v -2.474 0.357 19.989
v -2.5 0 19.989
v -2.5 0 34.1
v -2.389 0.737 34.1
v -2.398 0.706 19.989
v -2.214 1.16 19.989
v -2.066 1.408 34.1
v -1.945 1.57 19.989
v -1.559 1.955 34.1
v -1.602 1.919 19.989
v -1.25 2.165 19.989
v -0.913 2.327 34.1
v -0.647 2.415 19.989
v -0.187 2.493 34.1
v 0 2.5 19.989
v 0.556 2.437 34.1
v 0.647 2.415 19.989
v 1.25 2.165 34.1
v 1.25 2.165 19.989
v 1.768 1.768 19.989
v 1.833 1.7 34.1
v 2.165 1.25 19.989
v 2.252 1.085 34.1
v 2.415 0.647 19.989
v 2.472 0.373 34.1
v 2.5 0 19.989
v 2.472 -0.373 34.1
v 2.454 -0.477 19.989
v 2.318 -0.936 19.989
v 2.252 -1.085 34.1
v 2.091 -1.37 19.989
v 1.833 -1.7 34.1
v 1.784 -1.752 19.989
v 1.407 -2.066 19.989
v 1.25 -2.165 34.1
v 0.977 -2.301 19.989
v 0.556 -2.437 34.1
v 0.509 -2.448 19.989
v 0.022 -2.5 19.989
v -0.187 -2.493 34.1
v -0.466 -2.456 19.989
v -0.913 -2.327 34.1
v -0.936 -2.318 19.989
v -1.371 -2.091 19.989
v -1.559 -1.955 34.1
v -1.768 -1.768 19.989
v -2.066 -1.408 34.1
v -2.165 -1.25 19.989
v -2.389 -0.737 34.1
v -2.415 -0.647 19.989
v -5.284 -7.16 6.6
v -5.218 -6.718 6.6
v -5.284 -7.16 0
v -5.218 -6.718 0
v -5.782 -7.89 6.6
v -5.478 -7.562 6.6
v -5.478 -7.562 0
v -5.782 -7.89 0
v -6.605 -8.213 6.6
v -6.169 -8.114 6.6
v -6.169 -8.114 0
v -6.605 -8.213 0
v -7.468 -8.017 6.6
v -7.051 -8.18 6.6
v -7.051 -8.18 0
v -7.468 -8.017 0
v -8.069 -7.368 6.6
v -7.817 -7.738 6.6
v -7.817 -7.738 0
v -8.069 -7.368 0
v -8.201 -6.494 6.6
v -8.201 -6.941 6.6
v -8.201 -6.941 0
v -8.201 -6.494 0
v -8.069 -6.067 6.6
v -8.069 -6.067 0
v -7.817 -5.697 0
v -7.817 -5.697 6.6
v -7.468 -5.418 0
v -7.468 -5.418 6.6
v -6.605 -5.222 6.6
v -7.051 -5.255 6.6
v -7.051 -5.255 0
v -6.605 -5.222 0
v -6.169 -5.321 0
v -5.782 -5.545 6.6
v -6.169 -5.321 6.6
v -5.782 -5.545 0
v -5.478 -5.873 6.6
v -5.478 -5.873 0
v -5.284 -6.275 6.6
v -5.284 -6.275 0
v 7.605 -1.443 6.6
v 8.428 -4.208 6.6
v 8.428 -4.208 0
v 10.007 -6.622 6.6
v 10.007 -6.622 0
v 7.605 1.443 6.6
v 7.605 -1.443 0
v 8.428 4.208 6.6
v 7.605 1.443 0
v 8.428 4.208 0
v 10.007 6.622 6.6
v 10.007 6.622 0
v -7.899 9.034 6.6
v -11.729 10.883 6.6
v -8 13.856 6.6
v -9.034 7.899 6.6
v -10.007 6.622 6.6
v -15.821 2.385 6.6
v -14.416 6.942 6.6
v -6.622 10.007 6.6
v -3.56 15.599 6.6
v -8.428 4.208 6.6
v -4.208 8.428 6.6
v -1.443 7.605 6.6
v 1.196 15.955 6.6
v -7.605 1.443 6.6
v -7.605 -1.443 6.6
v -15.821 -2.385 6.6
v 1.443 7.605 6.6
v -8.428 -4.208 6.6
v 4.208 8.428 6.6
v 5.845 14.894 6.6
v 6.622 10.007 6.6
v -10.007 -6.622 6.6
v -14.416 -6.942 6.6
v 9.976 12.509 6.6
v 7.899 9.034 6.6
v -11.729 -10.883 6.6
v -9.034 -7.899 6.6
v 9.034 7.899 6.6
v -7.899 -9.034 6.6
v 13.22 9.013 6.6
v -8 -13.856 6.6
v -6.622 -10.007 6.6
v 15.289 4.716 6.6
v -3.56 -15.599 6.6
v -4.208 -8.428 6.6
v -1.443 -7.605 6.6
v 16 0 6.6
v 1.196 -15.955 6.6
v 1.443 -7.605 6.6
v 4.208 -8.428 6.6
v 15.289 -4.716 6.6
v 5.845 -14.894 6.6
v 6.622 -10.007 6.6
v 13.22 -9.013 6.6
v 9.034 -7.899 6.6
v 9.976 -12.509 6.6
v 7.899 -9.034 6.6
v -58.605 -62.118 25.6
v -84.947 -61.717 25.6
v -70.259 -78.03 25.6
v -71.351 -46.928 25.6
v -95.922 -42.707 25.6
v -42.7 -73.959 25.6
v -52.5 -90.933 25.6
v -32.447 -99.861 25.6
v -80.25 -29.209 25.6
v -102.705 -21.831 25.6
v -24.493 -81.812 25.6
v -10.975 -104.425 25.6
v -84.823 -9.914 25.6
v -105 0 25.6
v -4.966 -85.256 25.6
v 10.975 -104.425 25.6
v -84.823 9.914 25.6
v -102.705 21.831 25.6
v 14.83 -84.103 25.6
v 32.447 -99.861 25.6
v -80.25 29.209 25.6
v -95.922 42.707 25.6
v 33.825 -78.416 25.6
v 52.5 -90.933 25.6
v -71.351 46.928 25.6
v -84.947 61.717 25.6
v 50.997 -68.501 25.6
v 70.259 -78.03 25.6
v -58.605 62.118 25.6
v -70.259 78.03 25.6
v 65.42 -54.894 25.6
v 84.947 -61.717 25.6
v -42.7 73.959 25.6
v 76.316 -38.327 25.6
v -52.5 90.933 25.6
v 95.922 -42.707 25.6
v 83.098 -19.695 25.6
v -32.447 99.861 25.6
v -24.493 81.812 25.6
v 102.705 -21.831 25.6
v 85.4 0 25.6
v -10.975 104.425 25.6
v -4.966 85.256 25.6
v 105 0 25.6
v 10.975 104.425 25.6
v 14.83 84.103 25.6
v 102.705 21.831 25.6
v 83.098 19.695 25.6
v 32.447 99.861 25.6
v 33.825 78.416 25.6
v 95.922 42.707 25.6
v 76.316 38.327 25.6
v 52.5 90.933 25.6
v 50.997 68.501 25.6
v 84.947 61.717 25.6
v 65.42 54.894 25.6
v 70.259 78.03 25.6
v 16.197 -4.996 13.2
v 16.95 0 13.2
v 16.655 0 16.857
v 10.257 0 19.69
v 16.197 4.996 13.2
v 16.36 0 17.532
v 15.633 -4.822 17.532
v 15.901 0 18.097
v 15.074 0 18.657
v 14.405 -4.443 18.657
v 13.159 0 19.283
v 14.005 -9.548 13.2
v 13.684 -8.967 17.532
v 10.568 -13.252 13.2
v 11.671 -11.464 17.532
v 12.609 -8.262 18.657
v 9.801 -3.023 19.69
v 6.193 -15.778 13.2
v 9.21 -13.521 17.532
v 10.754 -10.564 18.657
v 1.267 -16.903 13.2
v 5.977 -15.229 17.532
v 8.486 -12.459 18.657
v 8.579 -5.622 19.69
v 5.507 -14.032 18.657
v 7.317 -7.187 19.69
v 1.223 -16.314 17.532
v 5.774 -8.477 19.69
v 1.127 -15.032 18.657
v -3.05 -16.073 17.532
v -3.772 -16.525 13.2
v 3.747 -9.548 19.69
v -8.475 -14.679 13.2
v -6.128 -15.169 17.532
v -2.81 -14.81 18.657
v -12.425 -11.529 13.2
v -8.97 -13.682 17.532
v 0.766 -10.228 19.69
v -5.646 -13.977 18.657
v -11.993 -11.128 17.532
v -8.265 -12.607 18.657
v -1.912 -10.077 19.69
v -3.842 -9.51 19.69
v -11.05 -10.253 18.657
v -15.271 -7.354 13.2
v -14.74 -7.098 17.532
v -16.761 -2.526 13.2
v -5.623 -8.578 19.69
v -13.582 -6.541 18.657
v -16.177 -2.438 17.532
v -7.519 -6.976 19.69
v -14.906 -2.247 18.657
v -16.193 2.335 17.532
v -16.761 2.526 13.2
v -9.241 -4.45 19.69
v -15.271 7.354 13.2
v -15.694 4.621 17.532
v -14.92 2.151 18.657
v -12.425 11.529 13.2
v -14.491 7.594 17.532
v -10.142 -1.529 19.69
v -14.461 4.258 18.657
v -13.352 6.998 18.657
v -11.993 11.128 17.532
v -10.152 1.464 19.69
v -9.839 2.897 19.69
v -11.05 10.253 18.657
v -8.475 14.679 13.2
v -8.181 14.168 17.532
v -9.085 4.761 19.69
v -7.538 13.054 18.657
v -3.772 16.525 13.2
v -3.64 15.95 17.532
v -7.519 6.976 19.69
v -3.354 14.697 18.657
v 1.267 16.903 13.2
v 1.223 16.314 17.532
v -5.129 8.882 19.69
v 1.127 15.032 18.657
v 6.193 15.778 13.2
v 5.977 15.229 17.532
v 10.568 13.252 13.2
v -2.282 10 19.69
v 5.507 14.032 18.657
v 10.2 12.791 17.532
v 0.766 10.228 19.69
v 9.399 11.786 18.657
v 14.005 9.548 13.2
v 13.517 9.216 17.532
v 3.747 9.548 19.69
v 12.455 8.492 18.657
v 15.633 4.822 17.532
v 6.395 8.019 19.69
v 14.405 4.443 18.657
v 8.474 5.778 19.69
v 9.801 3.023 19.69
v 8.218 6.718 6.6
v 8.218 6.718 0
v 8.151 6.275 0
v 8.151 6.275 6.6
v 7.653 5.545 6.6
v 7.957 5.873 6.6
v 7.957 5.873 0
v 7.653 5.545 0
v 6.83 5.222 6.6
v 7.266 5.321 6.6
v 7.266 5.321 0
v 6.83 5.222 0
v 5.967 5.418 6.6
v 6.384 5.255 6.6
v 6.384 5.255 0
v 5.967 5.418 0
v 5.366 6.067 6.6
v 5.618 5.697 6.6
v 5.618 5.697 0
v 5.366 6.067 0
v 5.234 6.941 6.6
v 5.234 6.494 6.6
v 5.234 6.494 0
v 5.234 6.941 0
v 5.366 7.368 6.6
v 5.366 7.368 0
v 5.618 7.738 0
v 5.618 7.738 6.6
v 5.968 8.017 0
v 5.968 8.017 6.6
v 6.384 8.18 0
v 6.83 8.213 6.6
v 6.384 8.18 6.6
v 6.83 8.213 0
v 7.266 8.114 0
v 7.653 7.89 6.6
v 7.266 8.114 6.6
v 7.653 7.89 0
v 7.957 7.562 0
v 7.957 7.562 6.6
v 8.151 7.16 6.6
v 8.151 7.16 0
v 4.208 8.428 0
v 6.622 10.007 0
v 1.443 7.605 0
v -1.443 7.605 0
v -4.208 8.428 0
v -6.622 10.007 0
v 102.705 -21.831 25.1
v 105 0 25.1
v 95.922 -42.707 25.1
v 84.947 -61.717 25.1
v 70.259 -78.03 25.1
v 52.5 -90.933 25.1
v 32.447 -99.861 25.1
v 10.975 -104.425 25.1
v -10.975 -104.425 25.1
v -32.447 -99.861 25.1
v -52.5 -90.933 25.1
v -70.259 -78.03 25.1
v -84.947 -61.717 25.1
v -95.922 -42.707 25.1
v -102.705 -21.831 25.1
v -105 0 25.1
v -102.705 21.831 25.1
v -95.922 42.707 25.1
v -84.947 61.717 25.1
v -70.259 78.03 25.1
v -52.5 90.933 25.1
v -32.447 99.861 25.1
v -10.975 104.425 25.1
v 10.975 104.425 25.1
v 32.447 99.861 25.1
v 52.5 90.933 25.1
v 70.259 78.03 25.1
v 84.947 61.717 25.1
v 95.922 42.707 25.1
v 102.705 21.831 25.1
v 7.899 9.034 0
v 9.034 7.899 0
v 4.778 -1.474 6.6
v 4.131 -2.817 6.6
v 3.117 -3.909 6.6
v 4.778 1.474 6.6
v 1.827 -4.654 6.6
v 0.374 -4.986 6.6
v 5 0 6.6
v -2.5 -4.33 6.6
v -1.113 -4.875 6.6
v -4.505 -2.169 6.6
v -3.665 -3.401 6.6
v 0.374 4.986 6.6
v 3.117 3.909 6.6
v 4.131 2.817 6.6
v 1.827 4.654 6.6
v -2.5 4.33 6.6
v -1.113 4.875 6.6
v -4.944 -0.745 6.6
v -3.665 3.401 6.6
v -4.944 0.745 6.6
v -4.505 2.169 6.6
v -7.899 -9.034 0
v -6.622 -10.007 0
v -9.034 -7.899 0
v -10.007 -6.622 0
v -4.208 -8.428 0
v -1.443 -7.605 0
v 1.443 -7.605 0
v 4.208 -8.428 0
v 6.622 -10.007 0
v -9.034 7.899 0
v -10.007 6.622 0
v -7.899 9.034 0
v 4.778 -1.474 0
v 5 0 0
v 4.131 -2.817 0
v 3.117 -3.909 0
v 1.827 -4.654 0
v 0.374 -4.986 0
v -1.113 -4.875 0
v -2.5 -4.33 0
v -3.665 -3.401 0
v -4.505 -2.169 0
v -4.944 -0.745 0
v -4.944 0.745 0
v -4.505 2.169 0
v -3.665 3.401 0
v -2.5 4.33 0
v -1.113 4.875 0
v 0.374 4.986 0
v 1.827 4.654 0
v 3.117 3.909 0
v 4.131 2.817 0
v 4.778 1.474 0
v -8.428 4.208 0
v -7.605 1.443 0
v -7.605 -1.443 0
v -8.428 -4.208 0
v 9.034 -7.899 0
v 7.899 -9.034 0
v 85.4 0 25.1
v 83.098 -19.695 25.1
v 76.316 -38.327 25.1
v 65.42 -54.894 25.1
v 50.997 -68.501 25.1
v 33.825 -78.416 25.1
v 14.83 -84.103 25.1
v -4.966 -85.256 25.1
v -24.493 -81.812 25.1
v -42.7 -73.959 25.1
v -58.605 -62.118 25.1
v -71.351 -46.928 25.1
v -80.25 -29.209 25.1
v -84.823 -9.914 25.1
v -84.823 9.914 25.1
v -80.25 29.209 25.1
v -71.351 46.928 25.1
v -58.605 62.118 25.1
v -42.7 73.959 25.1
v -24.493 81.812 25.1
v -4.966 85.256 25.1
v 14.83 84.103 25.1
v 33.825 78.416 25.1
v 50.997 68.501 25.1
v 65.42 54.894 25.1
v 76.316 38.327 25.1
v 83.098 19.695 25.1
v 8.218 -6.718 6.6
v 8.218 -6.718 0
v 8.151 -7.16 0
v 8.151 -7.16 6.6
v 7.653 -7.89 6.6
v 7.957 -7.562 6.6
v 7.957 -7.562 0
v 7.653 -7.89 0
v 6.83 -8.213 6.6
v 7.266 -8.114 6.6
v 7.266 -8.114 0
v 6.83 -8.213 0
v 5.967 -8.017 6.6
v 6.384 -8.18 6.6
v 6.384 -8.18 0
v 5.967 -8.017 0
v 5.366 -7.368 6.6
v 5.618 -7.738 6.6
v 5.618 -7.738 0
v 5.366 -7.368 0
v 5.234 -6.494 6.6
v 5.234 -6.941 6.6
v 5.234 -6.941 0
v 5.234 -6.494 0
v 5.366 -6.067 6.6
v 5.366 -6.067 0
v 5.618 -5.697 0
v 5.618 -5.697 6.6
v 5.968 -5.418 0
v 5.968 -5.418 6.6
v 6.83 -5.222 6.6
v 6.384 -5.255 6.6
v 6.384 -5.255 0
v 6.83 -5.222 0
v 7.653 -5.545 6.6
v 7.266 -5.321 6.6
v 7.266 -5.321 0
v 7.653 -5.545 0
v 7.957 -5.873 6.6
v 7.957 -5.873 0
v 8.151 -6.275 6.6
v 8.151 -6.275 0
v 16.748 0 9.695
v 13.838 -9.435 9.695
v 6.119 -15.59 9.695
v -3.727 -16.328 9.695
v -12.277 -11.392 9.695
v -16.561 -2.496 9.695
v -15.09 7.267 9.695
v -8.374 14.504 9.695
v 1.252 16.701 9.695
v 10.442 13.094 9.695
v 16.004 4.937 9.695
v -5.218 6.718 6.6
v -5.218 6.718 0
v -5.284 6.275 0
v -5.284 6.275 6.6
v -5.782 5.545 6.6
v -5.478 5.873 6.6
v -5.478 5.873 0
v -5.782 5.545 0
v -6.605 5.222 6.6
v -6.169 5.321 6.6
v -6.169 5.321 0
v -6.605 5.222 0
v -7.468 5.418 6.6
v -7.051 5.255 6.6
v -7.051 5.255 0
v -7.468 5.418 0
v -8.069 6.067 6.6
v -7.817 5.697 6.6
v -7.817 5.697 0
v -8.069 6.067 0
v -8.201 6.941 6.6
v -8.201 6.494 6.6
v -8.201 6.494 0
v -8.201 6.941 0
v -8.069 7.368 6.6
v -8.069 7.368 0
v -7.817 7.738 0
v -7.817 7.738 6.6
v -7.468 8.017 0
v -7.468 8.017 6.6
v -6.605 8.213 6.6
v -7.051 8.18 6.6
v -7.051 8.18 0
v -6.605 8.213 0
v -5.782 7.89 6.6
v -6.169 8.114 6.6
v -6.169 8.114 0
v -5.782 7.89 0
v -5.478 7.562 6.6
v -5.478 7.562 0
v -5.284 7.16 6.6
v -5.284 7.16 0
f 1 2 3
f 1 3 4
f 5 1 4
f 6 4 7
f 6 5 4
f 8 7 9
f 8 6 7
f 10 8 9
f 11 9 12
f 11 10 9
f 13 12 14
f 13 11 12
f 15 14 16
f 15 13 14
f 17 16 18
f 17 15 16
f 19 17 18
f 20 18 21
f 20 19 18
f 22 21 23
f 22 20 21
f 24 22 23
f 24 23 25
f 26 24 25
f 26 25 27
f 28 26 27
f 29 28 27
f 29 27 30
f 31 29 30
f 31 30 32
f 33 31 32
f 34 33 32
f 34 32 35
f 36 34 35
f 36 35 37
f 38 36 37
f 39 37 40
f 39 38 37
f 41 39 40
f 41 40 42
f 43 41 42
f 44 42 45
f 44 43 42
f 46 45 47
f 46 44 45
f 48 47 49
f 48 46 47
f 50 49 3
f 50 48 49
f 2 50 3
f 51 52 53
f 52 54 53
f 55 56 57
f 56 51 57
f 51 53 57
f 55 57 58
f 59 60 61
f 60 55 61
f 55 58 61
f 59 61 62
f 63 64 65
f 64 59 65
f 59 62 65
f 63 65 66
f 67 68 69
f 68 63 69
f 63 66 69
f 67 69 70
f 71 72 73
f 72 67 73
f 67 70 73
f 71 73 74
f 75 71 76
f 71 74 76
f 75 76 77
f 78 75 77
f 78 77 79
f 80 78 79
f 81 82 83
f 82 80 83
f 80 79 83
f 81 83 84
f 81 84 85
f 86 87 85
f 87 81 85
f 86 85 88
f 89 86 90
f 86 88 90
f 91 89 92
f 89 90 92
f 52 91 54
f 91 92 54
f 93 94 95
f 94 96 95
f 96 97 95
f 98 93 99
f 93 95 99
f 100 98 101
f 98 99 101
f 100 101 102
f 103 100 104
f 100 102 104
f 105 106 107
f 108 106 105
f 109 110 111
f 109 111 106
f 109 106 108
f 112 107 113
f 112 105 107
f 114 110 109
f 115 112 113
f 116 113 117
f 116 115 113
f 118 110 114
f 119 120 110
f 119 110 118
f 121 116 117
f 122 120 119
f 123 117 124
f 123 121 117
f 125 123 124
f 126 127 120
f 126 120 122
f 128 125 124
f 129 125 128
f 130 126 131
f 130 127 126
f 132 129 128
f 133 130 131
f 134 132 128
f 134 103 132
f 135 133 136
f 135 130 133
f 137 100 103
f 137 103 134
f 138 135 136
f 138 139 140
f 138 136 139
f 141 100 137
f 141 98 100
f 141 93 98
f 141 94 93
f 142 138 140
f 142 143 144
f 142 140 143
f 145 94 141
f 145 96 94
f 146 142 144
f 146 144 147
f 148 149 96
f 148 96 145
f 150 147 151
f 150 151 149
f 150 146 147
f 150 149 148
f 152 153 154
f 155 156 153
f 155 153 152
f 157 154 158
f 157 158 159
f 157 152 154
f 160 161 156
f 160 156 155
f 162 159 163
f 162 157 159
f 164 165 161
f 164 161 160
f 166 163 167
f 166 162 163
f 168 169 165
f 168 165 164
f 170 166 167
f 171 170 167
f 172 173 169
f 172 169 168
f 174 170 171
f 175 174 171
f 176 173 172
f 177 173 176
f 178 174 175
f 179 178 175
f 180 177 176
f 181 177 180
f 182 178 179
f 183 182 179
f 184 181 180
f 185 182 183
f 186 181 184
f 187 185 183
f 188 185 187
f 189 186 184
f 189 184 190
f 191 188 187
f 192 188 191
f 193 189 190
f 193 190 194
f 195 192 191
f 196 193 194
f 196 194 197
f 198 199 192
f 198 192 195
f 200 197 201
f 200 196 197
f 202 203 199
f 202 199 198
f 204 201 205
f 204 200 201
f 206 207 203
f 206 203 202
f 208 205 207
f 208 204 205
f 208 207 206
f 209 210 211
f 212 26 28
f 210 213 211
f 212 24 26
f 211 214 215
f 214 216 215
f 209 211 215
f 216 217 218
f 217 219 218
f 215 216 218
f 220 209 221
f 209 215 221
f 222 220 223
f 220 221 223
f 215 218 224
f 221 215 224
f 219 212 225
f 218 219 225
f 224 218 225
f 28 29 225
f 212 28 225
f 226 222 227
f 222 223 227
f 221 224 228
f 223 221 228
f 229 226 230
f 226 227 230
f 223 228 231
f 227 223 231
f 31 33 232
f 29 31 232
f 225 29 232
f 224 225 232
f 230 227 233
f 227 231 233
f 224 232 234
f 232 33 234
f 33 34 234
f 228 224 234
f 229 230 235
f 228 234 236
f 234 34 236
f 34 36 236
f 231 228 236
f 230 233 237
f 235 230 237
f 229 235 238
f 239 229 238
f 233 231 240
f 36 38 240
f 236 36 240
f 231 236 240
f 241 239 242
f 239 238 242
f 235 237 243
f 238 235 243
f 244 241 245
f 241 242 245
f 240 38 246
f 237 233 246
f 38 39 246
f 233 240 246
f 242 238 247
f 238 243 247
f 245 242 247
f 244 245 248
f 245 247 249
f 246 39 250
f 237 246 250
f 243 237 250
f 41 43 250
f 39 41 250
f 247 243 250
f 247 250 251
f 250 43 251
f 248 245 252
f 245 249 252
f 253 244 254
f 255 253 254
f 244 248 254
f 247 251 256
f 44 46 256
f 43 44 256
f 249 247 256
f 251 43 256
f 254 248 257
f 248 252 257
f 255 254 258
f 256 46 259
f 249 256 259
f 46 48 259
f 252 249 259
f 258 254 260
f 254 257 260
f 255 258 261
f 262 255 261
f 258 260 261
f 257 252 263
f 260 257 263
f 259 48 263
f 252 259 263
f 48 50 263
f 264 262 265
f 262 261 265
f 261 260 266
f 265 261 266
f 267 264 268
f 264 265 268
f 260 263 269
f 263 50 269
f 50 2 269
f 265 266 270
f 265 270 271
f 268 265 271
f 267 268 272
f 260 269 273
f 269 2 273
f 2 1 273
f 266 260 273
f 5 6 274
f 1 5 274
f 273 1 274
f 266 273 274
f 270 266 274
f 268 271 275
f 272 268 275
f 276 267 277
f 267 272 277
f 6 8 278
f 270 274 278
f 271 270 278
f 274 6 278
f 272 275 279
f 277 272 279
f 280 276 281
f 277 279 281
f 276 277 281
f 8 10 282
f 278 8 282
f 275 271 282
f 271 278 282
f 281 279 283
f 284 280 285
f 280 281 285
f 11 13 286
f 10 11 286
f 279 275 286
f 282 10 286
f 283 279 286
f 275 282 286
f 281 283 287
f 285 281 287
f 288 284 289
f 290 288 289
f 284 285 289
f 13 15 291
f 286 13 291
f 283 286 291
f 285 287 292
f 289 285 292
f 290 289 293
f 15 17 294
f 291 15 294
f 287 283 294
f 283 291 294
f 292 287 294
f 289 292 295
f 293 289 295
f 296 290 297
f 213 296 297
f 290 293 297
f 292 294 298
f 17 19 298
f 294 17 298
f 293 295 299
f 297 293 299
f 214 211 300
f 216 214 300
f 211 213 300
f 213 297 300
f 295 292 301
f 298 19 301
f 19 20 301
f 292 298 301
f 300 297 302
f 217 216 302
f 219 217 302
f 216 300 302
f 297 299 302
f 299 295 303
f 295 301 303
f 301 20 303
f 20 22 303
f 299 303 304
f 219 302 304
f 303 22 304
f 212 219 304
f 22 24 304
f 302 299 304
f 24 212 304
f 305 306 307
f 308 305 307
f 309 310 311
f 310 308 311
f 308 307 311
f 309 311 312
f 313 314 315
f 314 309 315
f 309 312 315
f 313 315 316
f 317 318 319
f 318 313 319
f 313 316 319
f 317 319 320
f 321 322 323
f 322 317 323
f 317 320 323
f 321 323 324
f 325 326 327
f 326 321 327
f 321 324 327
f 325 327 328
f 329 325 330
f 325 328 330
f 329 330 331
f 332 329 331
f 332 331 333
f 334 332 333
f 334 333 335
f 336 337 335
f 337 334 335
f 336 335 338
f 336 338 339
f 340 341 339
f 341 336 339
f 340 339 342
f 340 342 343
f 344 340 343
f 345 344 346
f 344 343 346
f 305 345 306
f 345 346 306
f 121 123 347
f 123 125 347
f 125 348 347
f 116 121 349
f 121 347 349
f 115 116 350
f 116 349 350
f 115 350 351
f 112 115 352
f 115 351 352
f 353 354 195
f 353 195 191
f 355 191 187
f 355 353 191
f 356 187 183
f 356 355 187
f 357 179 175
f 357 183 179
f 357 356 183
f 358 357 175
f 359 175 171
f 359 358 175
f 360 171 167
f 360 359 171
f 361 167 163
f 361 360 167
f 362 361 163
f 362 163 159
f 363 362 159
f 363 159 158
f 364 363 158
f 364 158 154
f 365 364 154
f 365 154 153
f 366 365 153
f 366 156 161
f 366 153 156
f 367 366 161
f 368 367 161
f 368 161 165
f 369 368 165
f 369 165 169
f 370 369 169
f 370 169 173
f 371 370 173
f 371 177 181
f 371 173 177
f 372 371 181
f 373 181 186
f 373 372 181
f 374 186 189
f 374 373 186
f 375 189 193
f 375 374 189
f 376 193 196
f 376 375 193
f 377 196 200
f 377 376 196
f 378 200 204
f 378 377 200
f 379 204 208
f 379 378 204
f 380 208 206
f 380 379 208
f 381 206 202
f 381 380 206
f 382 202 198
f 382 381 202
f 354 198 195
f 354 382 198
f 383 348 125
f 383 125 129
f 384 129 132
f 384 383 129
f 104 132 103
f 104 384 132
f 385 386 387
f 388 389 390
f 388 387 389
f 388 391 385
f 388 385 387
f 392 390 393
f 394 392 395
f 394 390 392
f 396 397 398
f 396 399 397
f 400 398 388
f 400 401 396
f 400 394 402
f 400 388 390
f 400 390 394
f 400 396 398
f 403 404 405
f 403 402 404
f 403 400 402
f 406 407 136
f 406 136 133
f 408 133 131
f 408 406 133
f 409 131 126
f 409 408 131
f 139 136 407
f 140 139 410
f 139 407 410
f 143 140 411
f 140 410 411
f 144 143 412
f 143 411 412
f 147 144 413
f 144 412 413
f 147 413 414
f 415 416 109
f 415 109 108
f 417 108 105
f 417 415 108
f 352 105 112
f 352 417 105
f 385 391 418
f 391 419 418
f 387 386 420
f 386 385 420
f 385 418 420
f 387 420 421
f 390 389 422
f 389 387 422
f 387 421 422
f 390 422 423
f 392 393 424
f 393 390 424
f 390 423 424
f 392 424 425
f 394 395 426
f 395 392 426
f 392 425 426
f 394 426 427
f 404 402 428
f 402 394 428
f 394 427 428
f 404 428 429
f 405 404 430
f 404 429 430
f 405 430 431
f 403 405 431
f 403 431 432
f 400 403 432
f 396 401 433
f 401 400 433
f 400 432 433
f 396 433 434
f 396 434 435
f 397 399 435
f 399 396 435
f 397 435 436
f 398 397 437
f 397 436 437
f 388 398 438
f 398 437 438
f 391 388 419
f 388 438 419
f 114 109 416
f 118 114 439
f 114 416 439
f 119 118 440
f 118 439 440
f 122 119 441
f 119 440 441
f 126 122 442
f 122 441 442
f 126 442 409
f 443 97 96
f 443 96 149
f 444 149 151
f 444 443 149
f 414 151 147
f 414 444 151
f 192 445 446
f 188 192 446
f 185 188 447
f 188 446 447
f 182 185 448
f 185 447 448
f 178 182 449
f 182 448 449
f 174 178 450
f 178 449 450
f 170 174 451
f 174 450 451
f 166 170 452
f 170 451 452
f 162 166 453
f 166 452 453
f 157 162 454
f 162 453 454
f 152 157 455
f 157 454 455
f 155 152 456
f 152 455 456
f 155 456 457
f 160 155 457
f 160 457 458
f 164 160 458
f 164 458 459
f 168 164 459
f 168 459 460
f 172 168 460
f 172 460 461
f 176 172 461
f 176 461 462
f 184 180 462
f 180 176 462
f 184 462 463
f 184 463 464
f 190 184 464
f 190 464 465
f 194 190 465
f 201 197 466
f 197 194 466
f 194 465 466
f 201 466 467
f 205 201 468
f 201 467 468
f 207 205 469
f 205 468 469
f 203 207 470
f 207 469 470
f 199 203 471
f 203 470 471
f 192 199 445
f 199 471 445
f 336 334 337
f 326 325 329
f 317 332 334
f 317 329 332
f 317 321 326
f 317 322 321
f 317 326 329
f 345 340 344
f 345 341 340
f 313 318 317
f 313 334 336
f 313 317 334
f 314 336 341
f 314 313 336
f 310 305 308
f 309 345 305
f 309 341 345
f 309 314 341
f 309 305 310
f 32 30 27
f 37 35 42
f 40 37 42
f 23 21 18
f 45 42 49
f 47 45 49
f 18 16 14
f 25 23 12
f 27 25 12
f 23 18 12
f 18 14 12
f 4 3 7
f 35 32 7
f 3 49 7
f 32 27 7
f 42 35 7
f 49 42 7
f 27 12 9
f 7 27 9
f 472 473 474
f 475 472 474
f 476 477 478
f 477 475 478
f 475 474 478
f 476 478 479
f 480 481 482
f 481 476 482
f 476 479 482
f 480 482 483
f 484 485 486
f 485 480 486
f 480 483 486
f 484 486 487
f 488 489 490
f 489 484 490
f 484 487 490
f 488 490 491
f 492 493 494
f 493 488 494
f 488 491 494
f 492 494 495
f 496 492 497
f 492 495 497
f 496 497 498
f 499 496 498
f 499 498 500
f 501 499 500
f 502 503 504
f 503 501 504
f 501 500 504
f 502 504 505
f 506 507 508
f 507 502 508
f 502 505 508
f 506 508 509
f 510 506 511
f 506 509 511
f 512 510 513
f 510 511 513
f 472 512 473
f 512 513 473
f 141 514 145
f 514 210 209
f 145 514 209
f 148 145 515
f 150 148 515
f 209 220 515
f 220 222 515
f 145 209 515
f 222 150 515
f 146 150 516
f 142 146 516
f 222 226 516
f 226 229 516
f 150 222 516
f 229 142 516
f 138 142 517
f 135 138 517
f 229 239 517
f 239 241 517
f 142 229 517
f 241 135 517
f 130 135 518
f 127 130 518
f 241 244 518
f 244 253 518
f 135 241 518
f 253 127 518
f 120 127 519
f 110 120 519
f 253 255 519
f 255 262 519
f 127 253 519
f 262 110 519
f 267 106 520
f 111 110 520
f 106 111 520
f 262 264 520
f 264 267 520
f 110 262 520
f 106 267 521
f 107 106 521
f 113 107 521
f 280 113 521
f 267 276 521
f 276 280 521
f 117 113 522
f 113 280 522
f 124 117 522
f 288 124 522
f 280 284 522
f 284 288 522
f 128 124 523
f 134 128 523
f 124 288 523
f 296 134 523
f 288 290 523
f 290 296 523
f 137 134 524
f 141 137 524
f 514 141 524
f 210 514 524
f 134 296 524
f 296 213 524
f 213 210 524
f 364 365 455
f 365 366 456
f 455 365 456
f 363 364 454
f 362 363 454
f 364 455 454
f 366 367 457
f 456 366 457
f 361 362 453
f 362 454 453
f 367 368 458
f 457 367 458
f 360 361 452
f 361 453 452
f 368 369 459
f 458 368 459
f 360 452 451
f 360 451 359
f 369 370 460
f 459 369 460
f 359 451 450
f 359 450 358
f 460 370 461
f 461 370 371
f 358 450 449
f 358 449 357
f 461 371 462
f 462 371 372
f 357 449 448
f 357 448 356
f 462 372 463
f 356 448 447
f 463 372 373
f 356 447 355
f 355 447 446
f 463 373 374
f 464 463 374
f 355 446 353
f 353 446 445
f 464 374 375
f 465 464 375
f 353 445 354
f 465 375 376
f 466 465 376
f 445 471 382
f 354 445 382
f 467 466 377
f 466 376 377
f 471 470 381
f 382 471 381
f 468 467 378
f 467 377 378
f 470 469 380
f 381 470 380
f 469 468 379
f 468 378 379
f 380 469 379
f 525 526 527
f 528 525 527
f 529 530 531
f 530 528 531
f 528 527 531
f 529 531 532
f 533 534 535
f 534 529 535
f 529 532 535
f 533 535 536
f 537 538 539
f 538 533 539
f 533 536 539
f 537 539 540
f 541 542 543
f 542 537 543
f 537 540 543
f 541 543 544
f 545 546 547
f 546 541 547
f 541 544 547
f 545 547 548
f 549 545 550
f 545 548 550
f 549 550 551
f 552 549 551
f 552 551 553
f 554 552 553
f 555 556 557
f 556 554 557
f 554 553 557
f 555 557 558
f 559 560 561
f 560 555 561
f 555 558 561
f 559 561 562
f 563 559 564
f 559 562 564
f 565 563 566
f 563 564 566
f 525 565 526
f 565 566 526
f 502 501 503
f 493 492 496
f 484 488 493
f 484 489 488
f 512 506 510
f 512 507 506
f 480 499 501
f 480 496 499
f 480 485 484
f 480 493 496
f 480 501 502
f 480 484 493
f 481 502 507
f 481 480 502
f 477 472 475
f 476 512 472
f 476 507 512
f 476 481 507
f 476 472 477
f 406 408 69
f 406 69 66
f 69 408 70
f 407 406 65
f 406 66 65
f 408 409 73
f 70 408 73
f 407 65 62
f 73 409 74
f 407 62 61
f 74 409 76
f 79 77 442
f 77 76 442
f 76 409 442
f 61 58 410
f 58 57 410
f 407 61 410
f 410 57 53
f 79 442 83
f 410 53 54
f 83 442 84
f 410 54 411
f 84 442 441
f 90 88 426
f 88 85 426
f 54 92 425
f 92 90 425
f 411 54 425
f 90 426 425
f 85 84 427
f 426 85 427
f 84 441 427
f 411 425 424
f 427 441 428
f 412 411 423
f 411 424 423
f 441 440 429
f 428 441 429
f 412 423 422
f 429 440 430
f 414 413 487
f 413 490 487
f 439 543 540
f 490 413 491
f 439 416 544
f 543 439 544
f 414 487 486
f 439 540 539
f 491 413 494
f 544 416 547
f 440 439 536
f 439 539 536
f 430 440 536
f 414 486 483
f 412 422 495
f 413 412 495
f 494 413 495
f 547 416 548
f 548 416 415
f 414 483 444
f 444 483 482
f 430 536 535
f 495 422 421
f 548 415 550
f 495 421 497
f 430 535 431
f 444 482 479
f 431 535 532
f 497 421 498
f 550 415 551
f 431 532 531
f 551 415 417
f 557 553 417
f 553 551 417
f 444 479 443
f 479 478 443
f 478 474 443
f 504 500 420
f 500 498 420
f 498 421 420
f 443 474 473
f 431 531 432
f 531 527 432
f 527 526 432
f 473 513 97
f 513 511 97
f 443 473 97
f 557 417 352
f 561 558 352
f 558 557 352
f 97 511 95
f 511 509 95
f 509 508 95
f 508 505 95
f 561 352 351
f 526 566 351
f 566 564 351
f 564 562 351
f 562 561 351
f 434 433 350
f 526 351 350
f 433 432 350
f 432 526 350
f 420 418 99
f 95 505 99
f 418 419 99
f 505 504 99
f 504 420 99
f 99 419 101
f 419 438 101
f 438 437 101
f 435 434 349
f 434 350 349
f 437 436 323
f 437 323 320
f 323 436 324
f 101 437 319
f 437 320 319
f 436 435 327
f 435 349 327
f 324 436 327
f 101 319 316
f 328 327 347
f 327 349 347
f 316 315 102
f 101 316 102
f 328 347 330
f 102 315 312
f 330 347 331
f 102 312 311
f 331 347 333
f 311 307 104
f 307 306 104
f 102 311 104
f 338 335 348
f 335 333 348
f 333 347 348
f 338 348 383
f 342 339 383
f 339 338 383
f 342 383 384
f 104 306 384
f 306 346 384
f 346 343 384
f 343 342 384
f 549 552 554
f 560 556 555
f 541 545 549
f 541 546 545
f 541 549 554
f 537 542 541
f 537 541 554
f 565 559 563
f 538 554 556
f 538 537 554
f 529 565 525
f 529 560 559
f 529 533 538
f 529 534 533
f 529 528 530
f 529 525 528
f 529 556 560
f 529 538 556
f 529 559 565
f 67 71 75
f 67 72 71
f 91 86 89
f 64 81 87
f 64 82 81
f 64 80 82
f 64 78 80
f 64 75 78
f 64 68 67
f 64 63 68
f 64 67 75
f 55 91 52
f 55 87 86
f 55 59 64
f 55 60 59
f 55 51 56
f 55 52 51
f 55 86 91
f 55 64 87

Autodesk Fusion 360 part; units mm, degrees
sketch "Skizze1" plane through (0, 0, 0) normal (0, 0, 1) x (1, 0, 0)
  circle A0 centre (0, 0) radius 9.5 construction
  line L0 (-6.7175, 6.7175) -> (6.7175, 6.7175) construction
  line L1 (6.7175, 6.7175) -> (6.7175, -6.7175) construction
  line L2 (6.7175, -6.7175) -> (-6.7175, -6.7175) construction
  line L3 (-6.7175, -6.7175) -> (-6.7175, 6.7175) construction
  line L4 (-6.7175, 6.7175) -> (6.7175, -6.7175) construction
  line L5 (6.7175, 6.7175) -> (-6.7175, -6.7175) construction
  circle A1 centre (-6.7175, 6.7175) radius 1.5
  circle A2 centre (6.7175, 6.7175) radius 1.5
  circle A3 centre (6.7175, -6.7175) radius 1.5
  circle A4 centre (-6.7175, -6.7175) radius 1.5
  circle A5 centre (0, 0) radius 17.5 construction
  line L6 (0, 17.5) -> (0, -17.5) construction
  line L7 (17.5, 0) -> (-17.5, 0) construction
  arc A6 (-9.5831, 14.6429) -> (9.5831, 14.6429) centre (0, 17.5) ccw
  arc A7 (14.6429, 9.5831) -> (14.6429, -9.5831) centre (17.5, 0) ccw
  arc A8 (9.5831, -14.6429) -> (-9.5831, -14.6429) centre (0, -17.5) ccw
  arc A9 (10.0071, 6.6225) -> (6.6225, 10.0071) centre (0, 0) ccw
  arc A10 (-14.6429, -9.5831) -> (-14.6429, 9.5831) centre (-17.5, 0) ccw
  arc A11 (-6.6225, 10.0071) -> (-10.0071, 6.6225) centre (0, 0) ccw
  arc A12 (-10.0071, -6.6225) -> (-6.6225, -10.0071) centre (0, 0) ccw
  arc A13 (6.6225, -10.0071) -> (10.0071, -6.6225) centre (0, 0) ccw
  circle A14 centre (0, 0) radius 5
  dimension "d1" = 19
  dimension "d2" = 3
  dimension "d3" = 35
  dimension "d4" = 20
  dimension "d5" = 10
  dimension "d6" = 12
extrude "Extrusion1" add sketch "Skizze1" along normal blind 6.6 makes body 1
sketch "Skizze3" plane through (0, 0, 0) normal (0, 1, 0) x (1, 0, 0)
  line L0 (-5.2175, -6.6) -> (-8.2175, -6.6)
  line L1 (5, -6.6) -> (-5, -6.6)
  line L2 (-5.2175, -6.6) -> (-8.2175, -6.6)
  line L3 (8.2175, -6.6) -> (5.2175, -6.6)
  line L4 (8.2175, -6.6) -> (5.2175, -6.6)
  line L5 (-10.0071, -6.6) -> (-6.6225, -6.6)
  line L6 (6.6225, -6.6) -> (-6.6225, -6.6)
  line L7 (6.6225, -6.6) -> (10.0071, -6.6)
  line L8 (10.0071, -6.6) -> (7.5, -6.6)
  line L9 (6.6225, -6.6) -> (10.0071, -6.6)
  line L10 (6.6225, -6.6) -> (-6.6225, -6.6)
  line L11 (-10.0071, -6.6) -> (-6.6225, -6.6)
  line L12 (-7.5, -6.6) -> (-10.0071, -6.6)
  line L13 (0, -6.6) -> (16, -6.6)
  spline S0 degree 5 poles (16, -6.6) (16.0942, -6.8538) (16.2705, -7.3729) (16.4989, -8.1862) (16.7304, -9.3406) (16.9005, -10.8897) (16.9635, -12.5072) (16.9487, -14.1142) (16.9133, -15.5669) (16.7566, -16.8027) (16.327, -17.7989) (15.4656, -18.5655) (14.0873, -19.1268) (12.1784, -19.5153) (9.7678, -19.7663) (6.9097, -19.9143) (4.3131, -19.9741) (2.2133, -19.9953) (0.7486, -20) (0, -20) knots 0 0 0 0 0 0 0.066667 0.133333 0.2 0.266667 0.333333 0.4 0.466667 0.533333 0.6 0.666667 0.733333 0.8 0.866667 0.933333 1 1 1 1 1 1
  line L14 (0, -20) -> (0, -6.6)
  line L15 (4.1146, -20) -> (-4.1146, -20)
  line L16 (16.95, -10.2) -> (16.95, -16.2)
  point P0 (16.95, -13.2)
  point P1 (16, -18)
  dimension "d12" = 16.95
  dimension "d13" = 13.4
  dimension "d18" = 6.6
  dimension "d19" = 16
  dimension "d20" = 2
revolve "Drehen1" add sketch "Skizze3" angle 360 about axis through (0, 0, 20) along (0, 0, -1) bodies 1
sketch "Skizze4" plane through (0, 0, 6.6) normal (0, 0, -1) x (-1, 0, 0)
  circle A0 centre (0, 0) radius 5
  circle A1 centre (0, 0) radius 2.5
  dimension "d15" = 5
extrude "Extrusion3" add sketch "Skizze4" against normal blind 27.5 contours A1 bodies 1
ref_plane "Arbeitsebene1" through (0, 0, 25.1) normal (0, 0, 1) x (1, 0, 0)
sketch "Skizze6" plane through (0, 0, 25.1) normal (0, 0, 1) x (1, 0, 0)
  circle A0 centre (0, 0) radius 85.4
  circle A1 centre (0, 0) radius 105
  dimension "d22" = 210
  dimension "d23" = 170.8
extrude "Extrusion5" add sketch "Skizze6" along normal blind 0.5 separate body makes body 2
equation "d12 = ( 33.9 / 2 ) * 1 mm"
